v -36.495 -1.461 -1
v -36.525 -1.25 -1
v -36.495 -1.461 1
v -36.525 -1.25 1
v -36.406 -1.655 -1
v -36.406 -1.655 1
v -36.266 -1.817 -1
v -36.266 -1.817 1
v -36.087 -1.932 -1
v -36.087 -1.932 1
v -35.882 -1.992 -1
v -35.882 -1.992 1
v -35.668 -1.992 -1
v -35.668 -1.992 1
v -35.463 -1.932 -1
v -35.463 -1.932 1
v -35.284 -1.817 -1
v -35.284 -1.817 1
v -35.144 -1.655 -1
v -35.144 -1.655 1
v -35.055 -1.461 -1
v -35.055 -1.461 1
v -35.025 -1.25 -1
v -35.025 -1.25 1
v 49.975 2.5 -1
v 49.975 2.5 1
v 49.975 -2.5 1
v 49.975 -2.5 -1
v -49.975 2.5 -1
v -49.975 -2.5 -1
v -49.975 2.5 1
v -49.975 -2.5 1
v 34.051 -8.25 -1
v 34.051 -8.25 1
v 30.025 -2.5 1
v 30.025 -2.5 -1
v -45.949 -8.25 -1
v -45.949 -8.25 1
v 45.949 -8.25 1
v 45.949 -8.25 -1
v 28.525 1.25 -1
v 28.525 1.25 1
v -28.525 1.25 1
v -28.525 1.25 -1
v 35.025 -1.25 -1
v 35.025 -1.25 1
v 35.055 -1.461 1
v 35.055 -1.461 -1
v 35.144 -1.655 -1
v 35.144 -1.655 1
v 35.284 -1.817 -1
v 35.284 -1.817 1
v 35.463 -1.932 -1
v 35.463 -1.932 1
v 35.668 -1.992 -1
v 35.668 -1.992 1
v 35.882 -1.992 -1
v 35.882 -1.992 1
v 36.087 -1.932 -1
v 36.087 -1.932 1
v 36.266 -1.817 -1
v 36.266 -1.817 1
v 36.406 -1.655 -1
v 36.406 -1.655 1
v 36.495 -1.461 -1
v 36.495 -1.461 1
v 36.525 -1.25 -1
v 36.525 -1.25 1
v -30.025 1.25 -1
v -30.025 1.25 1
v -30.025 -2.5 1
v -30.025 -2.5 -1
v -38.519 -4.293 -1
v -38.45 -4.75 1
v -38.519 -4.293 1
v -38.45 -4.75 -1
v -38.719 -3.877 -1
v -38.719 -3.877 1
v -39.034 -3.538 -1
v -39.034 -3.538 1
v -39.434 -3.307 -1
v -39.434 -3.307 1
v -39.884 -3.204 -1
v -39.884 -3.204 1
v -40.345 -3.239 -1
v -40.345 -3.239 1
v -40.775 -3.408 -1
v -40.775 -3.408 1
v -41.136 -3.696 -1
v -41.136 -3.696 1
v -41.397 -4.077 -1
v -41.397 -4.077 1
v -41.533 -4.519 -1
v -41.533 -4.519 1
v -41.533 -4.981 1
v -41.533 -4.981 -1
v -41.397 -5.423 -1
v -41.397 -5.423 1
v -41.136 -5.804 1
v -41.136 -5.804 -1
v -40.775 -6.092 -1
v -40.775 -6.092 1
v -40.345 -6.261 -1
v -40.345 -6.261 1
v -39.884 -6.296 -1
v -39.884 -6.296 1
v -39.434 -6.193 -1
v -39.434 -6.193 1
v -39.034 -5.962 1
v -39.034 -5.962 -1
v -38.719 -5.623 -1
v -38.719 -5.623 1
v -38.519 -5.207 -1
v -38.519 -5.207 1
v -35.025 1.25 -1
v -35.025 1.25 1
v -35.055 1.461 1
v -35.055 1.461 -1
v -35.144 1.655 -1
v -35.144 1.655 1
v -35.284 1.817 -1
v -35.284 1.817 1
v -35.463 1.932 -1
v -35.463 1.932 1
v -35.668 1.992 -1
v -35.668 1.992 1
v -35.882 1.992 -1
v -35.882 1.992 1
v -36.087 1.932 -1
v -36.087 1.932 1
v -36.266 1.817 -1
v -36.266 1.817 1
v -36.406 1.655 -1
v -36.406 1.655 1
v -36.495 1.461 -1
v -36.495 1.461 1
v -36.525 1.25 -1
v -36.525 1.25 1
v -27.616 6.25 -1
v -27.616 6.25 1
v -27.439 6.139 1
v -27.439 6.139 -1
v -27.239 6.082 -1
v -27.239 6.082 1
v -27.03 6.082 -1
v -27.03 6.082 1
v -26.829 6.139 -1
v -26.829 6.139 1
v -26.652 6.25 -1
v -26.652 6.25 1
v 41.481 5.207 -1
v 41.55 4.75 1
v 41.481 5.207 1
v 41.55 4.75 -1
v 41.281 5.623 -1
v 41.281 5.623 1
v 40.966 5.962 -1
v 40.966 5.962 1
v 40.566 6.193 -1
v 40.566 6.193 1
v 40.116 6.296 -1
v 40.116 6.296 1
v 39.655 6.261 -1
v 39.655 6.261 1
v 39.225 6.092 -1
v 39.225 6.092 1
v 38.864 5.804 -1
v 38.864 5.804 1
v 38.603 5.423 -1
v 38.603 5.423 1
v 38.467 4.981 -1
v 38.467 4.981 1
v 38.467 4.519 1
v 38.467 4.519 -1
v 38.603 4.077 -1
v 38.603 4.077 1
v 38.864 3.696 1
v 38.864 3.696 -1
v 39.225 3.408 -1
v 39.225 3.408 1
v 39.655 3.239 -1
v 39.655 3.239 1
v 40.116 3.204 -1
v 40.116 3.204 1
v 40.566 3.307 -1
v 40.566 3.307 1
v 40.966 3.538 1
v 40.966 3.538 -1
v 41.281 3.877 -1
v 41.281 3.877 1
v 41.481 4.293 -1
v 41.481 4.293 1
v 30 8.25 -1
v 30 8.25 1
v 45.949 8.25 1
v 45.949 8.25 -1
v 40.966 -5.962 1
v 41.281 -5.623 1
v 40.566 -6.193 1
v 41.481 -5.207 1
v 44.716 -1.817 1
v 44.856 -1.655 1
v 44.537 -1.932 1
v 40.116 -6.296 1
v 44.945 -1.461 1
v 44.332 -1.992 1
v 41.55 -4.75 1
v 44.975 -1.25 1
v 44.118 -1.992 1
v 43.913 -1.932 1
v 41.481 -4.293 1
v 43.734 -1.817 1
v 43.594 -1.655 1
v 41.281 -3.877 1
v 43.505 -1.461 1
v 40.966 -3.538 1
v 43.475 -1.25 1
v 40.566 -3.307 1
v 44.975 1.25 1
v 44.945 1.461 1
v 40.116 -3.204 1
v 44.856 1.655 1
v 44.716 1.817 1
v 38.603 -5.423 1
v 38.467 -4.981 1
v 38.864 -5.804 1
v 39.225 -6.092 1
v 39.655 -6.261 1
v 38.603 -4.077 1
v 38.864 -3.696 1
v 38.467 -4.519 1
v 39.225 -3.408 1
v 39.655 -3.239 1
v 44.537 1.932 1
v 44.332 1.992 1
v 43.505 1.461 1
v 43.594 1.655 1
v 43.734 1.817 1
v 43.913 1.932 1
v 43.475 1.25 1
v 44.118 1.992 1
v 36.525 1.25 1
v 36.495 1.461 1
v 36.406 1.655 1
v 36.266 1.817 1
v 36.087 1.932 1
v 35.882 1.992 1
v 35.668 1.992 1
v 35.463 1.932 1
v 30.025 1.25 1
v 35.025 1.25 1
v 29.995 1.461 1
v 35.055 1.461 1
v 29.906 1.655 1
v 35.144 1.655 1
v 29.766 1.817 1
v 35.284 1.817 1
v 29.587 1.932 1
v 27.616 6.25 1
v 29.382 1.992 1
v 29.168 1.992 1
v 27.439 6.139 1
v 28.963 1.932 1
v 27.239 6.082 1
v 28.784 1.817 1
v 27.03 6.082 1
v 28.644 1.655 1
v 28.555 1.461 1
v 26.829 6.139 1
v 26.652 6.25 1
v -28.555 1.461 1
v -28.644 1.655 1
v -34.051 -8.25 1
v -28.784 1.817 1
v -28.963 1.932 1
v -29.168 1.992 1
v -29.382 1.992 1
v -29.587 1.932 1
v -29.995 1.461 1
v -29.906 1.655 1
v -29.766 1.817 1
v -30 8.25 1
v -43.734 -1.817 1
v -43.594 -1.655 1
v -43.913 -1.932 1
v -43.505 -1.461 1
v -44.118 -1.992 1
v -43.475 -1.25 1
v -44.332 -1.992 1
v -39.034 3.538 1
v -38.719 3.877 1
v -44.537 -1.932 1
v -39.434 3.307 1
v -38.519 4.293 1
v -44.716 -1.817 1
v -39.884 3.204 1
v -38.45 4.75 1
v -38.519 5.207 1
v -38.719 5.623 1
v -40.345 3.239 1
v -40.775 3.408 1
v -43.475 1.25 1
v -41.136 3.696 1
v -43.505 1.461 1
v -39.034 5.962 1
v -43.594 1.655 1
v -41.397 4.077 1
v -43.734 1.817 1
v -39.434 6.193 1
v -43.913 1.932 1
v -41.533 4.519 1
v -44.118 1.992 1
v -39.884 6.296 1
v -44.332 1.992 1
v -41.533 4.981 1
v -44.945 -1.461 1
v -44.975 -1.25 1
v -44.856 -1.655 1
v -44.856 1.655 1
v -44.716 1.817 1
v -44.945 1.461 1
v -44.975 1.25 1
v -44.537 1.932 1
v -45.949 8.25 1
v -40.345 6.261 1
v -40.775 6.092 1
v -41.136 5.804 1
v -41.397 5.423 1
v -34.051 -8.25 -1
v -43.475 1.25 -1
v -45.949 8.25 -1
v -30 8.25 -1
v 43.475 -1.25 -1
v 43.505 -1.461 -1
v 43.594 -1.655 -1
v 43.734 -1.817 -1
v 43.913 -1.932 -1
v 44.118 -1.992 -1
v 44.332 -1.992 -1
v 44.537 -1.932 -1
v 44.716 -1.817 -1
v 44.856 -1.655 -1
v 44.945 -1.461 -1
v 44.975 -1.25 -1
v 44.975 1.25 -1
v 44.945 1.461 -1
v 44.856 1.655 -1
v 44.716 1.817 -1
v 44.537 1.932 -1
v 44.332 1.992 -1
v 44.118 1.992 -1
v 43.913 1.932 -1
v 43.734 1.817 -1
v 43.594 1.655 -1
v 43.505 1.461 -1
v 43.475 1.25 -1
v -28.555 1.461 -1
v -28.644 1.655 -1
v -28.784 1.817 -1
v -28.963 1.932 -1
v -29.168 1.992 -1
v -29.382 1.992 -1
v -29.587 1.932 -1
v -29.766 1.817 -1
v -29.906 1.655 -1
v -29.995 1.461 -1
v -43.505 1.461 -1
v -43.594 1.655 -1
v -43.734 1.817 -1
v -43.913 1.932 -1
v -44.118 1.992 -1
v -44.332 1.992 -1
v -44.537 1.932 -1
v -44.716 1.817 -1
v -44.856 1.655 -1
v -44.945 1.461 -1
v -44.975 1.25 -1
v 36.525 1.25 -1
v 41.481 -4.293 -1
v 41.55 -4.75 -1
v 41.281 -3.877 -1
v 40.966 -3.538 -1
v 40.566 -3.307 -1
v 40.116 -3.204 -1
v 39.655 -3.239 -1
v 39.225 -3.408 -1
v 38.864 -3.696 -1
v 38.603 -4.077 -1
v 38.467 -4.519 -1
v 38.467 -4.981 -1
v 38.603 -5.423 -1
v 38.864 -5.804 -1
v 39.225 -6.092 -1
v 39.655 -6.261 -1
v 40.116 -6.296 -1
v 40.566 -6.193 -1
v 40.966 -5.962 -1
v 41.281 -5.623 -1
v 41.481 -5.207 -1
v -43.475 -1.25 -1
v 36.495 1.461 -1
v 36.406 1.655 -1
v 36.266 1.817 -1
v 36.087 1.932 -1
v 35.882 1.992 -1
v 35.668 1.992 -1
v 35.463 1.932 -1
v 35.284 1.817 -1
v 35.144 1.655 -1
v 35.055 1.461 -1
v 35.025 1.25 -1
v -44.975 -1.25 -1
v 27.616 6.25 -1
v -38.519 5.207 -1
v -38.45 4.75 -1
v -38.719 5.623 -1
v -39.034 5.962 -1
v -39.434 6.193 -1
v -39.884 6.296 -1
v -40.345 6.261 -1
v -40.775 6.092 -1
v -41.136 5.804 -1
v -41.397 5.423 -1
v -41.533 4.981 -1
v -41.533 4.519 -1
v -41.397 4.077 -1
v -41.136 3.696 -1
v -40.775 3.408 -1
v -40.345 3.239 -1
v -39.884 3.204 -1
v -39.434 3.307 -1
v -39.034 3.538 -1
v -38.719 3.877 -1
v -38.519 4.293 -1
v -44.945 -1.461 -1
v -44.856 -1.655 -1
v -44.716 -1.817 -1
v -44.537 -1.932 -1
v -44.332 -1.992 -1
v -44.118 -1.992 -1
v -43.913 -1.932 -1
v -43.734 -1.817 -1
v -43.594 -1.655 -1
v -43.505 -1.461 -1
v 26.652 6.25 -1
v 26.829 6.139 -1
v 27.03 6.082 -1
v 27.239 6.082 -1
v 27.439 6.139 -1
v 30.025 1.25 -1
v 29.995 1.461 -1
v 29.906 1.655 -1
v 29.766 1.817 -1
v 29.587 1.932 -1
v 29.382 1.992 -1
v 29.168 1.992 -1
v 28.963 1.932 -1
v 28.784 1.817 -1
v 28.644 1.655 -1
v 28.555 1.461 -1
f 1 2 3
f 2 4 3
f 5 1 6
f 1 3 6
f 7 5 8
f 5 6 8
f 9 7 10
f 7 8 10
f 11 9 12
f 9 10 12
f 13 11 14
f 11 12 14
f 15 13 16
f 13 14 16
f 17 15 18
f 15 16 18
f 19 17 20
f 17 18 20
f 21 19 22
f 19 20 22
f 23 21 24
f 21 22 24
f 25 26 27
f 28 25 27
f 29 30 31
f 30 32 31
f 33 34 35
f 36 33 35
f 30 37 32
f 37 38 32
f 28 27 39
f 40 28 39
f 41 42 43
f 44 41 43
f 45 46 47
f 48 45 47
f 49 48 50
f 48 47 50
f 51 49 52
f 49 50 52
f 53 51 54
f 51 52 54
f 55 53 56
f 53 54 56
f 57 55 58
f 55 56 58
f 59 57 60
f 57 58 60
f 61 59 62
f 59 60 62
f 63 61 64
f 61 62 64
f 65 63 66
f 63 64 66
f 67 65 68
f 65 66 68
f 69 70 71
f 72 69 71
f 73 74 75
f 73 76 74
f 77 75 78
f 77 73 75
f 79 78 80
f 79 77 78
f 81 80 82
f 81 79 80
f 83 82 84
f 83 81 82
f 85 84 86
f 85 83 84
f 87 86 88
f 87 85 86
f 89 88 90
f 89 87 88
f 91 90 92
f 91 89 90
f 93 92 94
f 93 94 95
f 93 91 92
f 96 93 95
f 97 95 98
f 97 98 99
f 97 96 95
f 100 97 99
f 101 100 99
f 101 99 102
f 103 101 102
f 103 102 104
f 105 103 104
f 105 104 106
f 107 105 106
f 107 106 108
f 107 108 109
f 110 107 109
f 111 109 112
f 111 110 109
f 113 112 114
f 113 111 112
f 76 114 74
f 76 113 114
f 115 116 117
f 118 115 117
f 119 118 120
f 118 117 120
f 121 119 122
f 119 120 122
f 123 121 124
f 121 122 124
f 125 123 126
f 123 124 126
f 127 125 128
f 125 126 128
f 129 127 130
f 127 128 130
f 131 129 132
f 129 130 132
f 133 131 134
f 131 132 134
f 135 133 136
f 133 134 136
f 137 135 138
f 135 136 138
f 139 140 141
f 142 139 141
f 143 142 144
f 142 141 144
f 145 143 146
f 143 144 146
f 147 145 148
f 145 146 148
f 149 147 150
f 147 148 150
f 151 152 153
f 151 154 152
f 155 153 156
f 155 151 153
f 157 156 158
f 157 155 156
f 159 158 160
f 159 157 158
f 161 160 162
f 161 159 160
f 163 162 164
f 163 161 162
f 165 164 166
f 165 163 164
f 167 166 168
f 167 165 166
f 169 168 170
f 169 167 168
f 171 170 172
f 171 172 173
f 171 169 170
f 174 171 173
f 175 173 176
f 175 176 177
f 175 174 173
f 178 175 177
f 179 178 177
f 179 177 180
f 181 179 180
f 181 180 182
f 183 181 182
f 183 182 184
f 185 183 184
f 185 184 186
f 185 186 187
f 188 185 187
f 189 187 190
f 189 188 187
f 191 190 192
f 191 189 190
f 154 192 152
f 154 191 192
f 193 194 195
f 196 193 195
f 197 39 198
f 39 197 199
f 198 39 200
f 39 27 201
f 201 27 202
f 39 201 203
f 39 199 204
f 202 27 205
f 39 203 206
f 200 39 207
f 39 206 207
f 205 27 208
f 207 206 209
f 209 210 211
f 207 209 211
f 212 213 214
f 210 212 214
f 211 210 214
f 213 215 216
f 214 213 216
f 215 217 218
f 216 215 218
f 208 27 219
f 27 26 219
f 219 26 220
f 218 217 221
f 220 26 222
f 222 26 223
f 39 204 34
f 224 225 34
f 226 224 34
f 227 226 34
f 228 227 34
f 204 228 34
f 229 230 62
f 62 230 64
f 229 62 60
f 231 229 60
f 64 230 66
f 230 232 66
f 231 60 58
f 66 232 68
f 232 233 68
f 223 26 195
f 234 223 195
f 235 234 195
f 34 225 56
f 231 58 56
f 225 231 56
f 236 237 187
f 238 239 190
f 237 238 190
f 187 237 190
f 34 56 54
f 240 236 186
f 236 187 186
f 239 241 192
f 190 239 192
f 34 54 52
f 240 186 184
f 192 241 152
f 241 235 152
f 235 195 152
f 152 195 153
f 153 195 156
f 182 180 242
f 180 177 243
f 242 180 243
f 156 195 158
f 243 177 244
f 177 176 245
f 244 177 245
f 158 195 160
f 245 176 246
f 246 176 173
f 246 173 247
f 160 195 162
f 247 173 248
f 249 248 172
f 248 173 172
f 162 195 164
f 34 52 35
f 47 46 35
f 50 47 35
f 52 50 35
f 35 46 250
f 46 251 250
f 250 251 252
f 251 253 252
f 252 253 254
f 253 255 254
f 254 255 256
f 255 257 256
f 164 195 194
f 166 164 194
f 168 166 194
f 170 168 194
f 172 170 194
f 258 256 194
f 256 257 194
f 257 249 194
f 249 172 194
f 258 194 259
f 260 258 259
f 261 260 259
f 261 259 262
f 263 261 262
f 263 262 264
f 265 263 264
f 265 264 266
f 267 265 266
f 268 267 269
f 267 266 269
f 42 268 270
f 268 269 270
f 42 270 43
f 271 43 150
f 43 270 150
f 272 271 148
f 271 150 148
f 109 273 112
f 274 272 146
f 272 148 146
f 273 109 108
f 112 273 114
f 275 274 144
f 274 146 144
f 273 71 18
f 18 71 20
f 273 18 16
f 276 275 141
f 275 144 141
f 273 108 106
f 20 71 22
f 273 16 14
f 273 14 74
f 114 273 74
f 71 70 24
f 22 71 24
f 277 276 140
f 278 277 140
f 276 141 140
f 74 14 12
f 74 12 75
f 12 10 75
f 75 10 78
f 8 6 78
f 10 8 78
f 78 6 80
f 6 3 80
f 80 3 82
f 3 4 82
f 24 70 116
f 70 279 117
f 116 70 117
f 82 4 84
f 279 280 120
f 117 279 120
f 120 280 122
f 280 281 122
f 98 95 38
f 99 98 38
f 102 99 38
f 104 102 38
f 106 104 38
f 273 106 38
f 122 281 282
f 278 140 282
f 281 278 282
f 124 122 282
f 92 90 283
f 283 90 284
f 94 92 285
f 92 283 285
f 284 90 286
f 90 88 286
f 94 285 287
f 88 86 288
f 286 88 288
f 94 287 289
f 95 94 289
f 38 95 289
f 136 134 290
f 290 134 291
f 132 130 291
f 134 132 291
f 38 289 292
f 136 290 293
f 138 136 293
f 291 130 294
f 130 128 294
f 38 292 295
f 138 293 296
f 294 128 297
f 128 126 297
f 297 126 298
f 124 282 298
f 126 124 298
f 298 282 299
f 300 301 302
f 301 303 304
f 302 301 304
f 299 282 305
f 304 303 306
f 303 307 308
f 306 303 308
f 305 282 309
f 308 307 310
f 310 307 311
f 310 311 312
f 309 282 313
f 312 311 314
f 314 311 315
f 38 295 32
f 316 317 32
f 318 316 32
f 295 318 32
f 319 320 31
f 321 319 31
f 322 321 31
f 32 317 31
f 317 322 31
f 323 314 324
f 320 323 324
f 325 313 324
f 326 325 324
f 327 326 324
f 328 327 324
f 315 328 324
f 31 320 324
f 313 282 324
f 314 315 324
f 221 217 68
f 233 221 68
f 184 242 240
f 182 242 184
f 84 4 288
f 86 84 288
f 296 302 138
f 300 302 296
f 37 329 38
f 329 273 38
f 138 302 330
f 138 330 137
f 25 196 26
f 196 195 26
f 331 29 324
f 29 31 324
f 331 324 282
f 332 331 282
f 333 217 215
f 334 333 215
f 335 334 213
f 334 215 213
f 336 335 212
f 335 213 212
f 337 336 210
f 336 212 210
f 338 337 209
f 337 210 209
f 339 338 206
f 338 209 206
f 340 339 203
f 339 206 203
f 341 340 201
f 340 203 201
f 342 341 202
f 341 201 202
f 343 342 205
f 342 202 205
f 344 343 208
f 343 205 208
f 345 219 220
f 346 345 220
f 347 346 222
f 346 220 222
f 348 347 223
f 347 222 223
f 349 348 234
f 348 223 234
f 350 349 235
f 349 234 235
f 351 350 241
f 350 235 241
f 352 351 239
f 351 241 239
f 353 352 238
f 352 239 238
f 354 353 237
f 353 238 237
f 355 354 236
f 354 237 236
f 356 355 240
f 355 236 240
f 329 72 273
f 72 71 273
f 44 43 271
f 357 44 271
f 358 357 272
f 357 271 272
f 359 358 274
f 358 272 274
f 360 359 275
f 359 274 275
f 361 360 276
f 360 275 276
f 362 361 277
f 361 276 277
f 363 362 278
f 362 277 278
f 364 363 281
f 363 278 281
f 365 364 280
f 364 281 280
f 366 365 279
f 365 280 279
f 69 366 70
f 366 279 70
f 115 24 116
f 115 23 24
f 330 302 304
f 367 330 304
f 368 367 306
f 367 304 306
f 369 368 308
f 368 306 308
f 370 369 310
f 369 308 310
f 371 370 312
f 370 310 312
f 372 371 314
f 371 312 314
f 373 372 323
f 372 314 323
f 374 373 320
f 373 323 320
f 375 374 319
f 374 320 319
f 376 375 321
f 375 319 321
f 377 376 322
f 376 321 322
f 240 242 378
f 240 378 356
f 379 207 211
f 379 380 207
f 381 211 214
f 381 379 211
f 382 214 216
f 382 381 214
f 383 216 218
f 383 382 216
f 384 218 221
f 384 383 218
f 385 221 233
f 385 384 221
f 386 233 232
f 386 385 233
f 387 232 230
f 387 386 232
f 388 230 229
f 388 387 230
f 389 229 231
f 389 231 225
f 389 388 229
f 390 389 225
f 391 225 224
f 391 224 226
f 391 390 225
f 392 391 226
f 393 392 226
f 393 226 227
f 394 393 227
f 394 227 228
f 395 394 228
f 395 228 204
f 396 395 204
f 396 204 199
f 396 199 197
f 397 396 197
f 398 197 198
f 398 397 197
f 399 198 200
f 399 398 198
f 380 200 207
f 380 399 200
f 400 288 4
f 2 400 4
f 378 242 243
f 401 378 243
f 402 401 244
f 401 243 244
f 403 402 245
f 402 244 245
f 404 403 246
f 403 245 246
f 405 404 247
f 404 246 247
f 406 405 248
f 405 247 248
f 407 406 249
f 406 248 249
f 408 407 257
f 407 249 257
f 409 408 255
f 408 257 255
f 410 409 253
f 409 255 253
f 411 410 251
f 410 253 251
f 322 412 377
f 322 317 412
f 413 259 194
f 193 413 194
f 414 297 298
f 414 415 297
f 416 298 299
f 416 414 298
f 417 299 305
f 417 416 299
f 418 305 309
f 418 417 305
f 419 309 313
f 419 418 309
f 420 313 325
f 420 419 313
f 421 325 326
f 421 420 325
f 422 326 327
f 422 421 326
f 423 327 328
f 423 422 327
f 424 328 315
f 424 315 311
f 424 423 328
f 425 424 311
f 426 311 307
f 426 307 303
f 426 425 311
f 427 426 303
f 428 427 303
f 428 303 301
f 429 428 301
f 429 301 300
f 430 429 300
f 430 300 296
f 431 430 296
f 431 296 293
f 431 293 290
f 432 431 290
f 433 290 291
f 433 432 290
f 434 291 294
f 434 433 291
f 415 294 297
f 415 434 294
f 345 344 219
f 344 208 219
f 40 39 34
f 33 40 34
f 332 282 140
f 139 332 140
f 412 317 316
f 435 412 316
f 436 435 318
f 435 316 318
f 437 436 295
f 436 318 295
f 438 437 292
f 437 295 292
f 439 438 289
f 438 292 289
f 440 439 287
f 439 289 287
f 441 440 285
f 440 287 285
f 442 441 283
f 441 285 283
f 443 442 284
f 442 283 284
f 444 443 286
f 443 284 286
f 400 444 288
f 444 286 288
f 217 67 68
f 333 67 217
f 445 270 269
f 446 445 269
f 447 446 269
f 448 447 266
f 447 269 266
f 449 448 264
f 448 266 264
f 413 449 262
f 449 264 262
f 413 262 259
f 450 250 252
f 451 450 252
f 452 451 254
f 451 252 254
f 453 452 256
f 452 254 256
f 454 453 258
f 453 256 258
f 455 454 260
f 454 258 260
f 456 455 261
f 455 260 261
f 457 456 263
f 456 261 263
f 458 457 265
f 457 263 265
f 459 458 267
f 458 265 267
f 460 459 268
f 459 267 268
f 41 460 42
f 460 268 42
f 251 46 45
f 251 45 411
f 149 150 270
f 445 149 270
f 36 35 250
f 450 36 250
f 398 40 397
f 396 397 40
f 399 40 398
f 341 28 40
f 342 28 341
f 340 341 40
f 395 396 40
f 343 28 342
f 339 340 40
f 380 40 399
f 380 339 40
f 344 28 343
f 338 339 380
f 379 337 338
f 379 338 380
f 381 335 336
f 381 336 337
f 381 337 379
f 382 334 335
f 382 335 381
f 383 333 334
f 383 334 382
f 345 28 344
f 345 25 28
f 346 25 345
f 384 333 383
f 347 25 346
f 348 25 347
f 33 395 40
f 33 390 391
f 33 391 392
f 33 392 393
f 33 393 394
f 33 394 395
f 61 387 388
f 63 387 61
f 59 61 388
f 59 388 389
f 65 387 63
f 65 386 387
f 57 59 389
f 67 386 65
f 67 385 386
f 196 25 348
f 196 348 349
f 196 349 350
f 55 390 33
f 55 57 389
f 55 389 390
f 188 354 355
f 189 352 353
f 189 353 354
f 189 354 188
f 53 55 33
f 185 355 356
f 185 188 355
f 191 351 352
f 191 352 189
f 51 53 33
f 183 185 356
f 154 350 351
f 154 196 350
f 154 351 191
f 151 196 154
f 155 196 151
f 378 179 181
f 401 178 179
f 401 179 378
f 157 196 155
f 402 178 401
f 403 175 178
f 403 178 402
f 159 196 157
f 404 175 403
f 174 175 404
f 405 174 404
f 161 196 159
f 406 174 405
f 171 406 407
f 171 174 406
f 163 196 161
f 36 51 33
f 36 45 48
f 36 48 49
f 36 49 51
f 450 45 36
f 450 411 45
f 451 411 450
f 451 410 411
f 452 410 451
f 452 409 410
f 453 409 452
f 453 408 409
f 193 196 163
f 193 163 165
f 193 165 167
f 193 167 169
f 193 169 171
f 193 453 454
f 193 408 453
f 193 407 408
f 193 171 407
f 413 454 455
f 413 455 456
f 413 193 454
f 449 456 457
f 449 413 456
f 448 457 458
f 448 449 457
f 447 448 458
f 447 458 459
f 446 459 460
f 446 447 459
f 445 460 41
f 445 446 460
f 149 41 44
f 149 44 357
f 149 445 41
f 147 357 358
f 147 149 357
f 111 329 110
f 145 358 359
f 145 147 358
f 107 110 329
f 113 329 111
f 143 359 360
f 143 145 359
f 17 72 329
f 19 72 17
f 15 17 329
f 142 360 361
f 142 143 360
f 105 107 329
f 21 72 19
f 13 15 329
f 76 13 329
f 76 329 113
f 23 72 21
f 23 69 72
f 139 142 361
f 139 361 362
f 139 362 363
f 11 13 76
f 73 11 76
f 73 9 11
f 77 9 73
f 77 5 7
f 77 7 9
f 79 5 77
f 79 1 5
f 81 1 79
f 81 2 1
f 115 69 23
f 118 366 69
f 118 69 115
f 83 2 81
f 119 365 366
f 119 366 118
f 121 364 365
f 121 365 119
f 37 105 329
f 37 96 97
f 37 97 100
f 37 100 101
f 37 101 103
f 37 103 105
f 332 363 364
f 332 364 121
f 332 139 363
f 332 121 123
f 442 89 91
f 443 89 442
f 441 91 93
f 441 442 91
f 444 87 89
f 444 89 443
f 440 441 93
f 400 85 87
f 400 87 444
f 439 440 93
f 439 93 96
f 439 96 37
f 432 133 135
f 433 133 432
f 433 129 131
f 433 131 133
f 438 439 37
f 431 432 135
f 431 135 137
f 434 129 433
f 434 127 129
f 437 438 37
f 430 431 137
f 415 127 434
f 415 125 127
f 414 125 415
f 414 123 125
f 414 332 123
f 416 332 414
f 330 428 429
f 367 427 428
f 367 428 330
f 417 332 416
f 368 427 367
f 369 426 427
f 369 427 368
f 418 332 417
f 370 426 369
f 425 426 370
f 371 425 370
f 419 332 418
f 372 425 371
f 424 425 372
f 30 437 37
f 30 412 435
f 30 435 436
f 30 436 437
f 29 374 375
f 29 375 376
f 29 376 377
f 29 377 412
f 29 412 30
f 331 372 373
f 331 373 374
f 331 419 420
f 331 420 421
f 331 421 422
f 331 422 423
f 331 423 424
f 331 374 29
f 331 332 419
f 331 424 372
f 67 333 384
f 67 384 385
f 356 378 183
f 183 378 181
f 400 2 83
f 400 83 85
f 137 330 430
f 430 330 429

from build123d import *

# Parameters (mm, degrees)
SKETCH_1_R          = 1.55
SKETCH_1_W          = 9.95
SKETCH_1_H          = 2.5
EXTRUDE_1_DEPTH     = 1
SKETCH_2_R          = 0.75
CUT_EXTRUDE_1_DEPTH = 3
CUT_EXTRUDE_2_DEPTH = 3
SKETCH_4_R          = 0.75
CUT_EXTRUDE_3_DEPTH = 3


with BuildPart() as part:
    # 草图1 → 凸台-拉伸1 (new body, symmetric)
    with BuildSketch(Plane.XY):
        Polygon((-30.025, 1.25), (-30.025, -2.5), (-34.051193345, -8.25), (-45.948806655, -8.25), (-49.975, -2.5), (-49.975, 2.5), (-45.948806655, 8.25), (45.948806655, 8.25), (49.975, 2.5), (49.975, -2.5), (45.948806655, -8.25), (34.051193345, -8.25), (30.025, -2.5), (30.025, 1.25), align=None)
        with Locations((-40, 4.75)):
            Circle(SKETCH_1_R, mode=Mode.SUBTRACT)
        with Locations((-40, -4.75)):
            Circle(SKETCH_1_R, mode=Mode.SUBTRACT)
        with Locations((40, -4.75)):
            Circle(SKETCH_1_R, mode=Mode.SUBTRACT)
        with Locations((40, 4.75)):
            Circle(SKETCH_1_R, mode=Mode.SUBTRACT)
        with Locations((-40, 0)):
            Rectangle(SKETCH_1_W, SKETCH_1_H, mode=Mode.SUBTRACT)
        with Locations((40, 0)):
            Rectangle(SKETCH_1_W, SKETCH_1_H, mode=Mode.SUBTRACT)
    extrude(amount=EXTRUDE_1_DEPTH, both=True)

    # 草图2 → 切除-拉伸1 (cut, through all)
    with BuildSketch(Plane.XY.offset(1)):
        with Locations((-35.775, 1.25)):
            Circle(SKETCH_2_R)
        with Locations((-35.775, -1.25)):
            Circle(SKETCH_2_R)
        with Locations((-44.225, 1.25)):
            Circle(SKETCH_2_R)
        with Locations((-44.225, -1.25)):
            Circle(SKETCH_2_R)
        with Locations((-29.275, 1.25)):
            Circle(SKETCH_2_R)
        with Locations((29.275, 1.25)):
            Circle(SKETCH_2_R)
        with Locations((44.225, -1.25)):
            Circle(SKETCH_2_R)
        with Locations((44.225, 1.25)):
            Circle(SKETCH_2_R)
        with Locations((35.775, -1.25)):
            Circle(SKETCH_2_R)
        with Locations((35.775, 1.25)):
            Circle(SKETCH_2_R)
    extrude(amount=-CUT_EXTRUDE_1_DEPTH, mode=Mode.SUBTRACT)

    # 草图3 → 切除-拉伸2 (cut, through all)
    with BuildSketch(Plane.XY.offset(1)):
        Polygon((-30, 8.25), (-27.616492815, 6.25), (27.616492815, 6.25), (30, 8.25), align=None)
    extrude(amount=-CUT_EXTRUDE_2_DEPTH, mode=Mode.SUBTRACT)

    # 草图4 → 切除-拉伸3 (cut, through all)
    with BuildSketch(Plane.XY.offset(1)):
        with Locations((-27.134402108, 6.824533332)):
            Circle(SKETCH_4_R)
        with Locations((27.134402108, 6.824533332)):
            Circle(SKETCH_4_R)
    extrude(amount=-CUT_EXTRUDE_3_DEPTH, mode=Mode.SUBTRACT)


solid = part.part
